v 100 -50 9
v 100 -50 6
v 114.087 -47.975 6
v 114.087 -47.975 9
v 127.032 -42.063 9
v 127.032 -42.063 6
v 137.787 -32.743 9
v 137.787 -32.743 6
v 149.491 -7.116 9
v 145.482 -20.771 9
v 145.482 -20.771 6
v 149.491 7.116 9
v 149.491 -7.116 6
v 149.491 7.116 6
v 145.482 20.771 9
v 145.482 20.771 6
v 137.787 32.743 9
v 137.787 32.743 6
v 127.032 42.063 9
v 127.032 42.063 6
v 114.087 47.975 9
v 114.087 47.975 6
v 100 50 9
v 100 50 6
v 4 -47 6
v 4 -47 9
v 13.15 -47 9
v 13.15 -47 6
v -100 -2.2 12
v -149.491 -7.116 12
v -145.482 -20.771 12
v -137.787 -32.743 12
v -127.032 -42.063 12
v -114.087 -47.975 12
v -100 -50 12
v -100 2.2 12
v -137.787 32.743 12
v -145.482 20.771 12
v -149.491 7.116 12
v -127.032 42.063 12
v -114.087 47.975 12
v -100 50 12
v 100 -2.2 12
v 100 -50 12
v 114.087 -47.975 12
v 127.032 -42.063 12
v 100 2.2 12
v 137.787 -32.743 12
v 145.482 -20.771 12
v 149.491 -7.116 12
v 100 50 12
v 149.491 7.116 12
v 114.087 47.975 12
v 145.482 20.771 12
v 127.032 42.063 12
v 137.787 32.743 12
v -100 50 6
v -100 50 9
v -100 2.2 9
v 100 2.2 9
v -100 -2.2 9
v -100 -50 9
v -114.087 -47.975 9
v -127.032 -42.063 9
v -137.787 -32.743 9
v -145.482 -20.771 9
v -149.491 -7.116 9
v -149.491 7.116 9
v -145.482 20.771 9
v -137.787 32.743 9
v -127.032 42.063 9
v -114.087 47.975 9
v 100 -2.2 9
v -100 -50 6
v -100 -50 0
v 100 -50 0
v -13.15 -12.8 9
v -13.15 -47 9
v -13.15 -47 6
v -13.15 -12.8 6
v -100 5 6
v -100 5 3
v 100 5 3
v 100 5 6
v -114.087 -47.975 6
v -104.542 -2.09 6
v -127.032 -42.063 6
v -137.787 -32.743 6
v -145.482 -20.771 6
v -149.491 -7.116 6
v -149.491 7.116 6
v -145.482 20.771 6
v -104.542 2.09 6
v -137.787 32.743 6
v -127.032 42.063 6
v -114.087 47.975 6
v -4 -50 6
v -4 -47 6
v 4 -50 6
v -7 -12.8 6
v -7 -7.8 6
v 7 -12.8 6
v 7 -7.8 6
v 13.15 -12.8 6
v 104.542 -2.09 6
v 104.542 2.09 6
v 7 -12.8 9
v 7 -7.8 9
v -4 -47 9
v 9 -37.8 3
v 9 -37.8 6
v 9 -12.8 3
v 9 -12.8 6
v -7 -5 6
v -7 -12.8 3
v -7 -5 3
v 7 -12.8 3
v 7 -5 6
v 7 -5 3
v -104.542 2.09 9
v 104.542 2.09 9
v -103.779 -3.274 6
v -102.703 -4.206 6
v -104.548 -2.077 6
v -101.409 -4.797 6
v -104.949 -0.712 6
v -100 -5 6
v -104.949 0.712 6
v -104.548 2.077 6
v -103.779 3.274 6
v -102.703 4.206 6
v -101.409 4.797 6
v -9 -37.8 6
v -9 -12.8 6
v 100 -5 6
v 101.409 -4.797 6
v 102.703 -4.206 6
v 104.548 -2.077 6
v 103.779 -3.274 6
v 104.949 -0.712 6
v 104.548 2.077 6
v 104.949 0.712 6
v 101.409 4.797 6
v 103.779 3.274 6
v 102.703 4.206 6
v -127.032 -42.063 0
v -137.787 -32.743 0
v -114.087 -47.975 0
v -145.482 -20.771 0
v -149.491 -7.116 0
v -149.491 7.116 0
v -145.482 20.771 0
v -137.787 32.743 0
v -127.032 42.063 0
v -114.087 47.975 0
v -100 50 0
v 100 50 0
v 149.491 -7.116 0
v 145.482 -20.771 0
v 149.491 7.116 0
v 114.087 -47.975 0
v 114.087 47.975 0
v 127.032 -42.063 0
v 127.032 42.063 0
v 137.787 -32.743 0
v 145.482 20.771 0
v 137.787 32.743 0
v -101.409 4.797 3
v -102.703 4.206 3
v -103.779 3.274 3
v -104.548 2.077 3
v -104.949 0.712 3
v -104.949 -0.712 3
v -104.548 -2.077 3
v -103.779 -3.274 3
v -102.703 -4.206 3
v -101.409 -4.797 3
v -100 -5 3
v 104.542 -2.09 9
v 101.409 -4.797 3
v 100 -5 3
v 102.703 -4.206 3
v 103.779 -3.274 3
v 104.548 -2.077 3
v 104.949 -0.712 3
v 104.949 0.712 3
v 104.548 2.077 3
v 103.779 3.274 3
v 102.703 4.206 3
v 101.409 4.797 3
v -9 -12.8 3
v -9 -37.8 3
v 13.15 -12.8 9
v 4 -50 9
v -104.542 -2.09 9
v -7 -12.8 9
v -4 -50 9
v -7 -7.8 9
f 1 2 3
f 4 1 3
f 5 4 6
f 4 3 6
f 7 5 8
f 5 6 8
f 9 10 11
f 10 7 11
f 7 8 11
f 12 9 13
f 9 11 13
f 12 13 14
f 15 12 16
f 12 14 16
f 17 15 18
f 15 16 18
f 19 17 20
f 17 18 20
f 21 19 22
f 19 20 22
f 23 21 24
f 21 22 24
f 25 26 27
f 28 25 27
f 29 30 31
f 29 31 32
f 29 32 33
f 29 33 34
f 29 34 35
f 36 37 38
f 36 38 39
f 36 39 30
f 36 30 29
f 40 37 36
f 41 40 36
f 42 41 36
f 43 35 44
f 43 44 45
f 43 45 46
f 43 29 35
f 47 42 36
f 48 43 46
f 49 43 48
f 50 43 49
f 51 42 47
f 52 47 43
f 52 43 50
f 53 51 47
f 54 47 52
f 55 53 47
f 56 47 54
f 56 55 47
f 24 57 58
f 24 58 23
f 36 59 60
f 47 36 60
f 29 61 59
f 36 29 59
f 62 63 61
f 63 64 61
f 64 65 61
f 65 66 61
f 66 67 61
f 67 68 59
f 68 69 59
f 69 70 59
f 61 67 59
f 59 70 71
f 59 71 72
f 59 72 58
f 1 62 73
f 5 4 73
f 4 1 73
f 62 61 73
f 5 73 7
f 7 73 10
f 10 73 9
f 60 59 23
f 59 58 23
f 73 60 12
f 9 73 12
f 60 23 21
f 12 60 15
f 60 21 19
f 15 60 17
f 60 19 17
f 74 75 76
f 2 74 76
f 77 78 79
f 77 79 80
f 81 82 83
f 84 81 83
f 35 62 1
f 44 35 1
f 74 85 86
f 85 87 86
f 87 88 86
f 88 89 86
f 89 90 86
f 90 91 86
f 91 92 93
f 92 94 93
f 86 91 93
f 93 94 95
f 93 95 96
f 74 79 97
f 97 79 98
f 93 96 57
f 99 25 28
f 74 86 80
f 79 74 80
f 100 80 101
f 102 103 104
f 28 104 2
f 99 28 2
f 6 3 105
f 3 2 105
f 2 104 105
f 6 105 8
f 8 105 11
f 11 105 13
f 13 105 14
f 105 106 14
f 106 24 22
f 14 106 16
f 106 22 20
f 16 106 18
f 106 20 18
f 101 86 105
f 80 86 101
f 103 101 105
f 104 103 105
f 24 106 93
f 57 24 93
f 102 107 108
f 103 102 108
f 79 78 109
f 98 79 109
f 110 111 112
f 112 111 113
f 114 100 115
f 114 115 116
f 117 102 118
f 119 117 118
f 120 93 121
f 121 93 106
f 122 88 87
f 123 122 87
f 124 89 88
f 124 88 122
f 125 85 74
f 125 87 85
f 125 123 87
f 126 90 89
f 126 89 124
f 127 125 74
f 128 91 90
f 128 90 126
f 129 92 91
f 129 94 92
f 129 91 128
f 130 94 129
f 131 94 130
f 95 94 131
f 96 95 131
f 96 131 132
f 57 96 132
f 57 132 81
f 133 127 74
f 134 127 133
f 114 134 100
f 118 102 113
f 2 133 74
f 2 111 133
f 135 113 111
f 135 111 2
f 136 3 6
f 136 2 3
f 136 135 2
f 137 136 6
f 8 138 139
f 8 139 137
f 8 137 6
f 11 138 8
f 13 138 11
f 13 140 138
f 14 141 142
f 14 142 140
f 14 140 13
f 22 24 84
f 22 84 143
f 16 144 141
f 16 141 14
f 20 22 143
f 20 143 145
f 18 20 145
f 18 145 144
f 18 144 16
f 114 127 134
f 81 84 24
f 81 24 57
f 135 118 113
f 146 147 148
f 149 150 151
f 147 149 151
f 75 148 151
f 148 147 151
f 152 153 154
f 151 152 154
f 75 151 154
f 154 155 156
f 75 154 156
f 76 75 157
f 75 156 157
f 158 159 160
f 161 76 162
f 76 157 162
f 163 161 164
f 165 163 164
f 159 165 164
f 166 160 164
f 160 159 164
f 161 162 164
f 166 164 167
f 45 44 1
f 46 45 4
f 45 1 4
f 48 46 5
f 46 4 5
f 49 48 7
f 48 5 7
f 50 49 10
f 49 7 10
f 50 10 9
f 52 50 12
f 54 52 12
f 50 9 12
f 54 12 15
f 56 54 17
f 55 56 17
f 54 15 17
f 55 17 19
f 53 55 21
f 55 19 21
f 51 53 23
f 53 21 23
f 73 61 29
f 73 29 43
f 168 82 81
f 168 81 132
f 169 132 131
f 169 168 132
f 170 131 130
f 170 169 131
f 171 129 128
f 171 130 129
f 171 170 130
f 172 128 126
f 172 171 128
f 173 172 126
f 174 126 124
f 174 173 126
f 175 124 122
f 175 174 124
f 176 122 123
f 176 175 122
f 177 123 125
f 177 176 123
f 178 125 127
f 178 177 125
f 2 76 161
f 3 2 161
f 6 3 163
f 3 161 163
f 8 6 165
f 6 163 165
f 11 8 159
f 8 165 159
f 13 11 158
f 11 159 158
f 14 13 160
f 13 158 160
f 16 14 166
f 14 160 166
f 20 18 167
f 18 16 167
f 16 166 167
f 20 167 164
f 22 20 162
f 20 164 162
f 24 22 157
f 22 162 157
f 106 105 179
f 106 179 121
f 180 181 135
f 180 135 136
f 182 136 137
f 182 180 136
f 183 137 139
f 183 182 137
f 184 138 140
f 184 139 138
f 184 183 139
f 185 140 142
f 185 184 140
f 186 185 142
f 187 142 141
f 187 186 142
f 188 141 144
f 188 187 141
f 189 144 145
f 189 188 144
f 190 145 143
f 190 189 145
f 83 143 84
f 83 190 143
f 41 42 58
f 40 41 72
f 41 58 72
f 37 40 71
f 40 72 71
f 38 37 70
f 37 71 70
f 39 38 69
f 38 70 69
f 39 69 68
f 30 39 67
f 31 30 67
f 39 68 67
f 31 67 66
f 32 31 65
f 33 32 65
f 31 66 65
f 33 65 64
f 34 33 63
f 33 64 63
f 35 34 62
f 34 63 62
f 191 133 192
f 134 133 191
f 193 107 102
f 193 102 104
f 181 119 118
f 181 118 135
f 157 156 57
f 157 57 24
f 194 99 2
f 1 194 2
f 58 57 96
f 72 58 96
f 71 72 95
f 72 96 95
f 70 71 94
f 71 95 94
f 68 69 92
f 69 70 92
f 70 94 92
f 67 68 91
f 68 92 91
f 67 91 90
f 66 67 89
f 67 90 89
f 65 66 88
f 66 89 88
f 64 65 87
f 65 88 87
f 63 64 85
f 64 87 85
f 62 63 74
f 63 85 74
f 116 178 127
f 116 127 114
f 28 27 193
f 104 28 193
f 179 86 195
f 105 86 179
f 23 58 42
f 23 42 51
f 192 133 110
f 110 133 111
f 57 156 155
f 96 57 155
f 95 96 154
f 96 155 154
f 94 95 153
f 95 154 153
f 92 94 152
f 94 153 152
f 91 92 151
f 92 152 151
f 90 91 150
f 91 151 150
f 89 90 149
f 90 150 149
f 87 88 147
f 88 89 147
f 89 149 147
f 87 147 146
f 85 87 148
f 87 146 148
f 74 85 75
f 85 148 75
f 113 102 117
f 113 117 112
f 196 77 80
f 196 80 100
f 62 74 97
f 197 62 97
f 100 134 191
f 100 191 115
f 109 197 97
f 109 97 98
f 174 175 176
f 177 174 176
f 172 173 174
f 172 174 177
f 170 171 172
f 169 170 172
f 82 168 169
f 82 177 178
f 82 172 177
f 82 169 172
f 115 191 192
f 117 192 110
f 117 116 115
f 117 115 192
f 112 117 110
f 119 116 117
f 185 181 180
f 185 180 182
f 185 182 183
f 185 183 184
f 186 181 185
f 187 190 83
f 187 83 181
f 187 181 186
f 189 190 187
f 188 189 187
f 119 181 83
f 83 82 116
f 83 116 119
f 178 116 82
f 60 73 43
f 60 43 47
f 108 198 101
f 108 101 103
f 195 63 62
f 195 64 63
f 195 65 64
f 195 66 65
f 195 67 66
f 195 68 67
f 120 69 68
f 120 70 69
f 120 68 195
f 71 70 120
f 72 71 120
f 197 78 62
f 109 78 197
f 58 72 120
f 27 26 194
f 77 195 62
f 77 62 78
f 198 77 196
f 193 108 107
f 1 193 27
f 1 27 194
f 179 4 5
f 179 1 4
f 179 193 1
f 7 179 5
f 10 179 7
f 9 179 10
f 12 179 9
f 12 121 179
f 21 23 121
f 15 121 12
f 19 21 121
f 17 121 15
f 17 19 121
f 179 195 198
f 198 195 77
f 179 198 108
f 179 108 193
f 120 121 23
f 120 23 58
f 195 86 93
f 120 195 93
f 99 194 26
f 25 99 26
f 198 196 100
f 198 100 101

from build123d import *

# Parameters (mm, degrees)
BOX_BOTTOM_HALF_0_W     = 301.98633
BOX_BOTTOM_HALF_0_H     = 102
BOX_BOTTOM_HALF_0_DEPTH = 7
PAD_DEPTH               = 3
PAD001_DEPTH            = 3
SKETCH002_W             = 209.08447
SKETCH002_H             = 4.18
PAD002_DEPTH            = 3
SKETCH003_W             = 26.3
SKETCH003_H             = 34.2
POCKET_DEPTH            = 3
SKETCH004_W             = 18
SKETCH004_H             = 25
POCKET001_DEPTH         = 3
SKETCH005_W             = 14
SKETCH005_H             = 5
POCKET002_DEPTH         = 6
SKETCH006_W             = 14
SKETCH006_H             = 3
POCKET003_DEPTH         = 3
SKETCH007_W             = 8
SKETCH007_H             = 3
POCKET004_DEPTH         = 3
SKETCH008_W             = 200
SKETCH008_H             = 4.4
PAD003_DEPTH            = 3
BOX_BOTTOM_HALF_1_W     = 301.98633
BOX_BOTTOM_HALF_1_H     = 102
BOX_BOTTOM_HALF_1_DEPTH = 4


with BuildPart() as box_bottom_half_0_body:
    # box_bottom_half_0 → box_bottom_half_0 (new body)
    with BuildSketch(Plane(origin=(-150.993165, -51, -1), x_dir=(1, 0, 0), z_dir=(0, 0, 1))):
        with Locations((150.993165, 51)):
            Rectangle(BOX_BOTTOM_HALF_0_W, BOX_BOTTOM_HALF_0_H)
    extrude(amount=BOX_BOTTOM_HALF_0_DEPTH)


with BuildPart() as body:
    # Sketch → Pad (new body)
    with BuildSketch(Plane.XY):
        with BuildLine():
            ThreePointArc((-100, 50), (-150, 0), (-100, -50))
            Line((-100, -50), (100, -50))
            ThreePointArc((100, -50), (150, 0), (100, 50))
            Line((-100, 50), (100, 50))
        make_face()
    extrude(amount=PAD_DEPTH)

    # Sketch001 (on Face6 of Pad) → Pad001 (join)
    with BuildSketch(Plane.XY.offset(3)):
        with BuildLine():
            ThreePointArc((-100, 50), (-150, 0), (-100, -50))
            Line((-100, -50), (100, -50))
            ThreePointArc((100, -50), (150, 0), (100, 50))
            Line((-100, 50), (100, 50))
        make_face()
        with BuildLine():
            ThreePointArc((-100, 5), (-105, 0), (-100, -5))
            Line((-100, -5), (100, -5))
            ThreePointArc((100, -5), (105, 0), (100, 5))
            Line((-100, 5), (100, 5))
        make_face(mode=Mode.SUBTRACT)
    extrude(amount=PAD001_DEPTH)

    # Sketch002 (on Face9 of Pad001) → Pad002 (join)
    with BuildSketch(Plane.XY.offset(6)):
        with BuildLine():
            ThreePointArc((-100, 50), (-150, 0), (-100, -50))
            Line((-100, -50), (100, -50))
            ThreePointArc((100, -50), (150, 0), (100, 50))
            Line((-100, 50), (100, 50))
        make_face()
        Rectangle(SKETCH002_W, SKETCH002_H, mode=Mode.SUBTRACT)
    extrude(amount=PAD002_DEPTH)

    # Sketch003 (on Face13 of Pad002) → Pocket (cut)
    with BuildSketch(Plane.XY.offset(9)):
        with Locations((0, -29.9)):
            Rectangle(SKETCH003_W, SKETCH003_H)
    extrude(amount=-POCKET_DEPTH, mode=Mode.SUBTRACT)

    # Sketch004 (on Face27 of Pocket) → Pocket001 (cut)
    with BuildSketch(Plane.XY.offset(6)):
        with Locations((0, -25.3)):
            Rectangle(SKETCH004_W, SKETCH004_H)
    extrude(amount=-POCKET001_DEPTH, mode=Mode.SUBTRACT)

    # Sketch005 (on Face13 of Pocket001) → Pocket002 (cut)
    with BuildSketch(Plane.XY.offset(9)):
        with Locations((0, -10.3)):
            Rectangle(SKETCH005_W, SKETCH005_H)
    extrude(amount=-POCKET002_DEPTH, mode=Mode.SUBTRACT)

    # Sketch006 (on Face23 of Pocket002) → Pocket003 (cut)
    with BuildSketch(Plane.XZ.offset(7.8)):
        with Locations((0, 4.5)):
            Rectangle(SKETCH006_W, SKETCH006_H)
    extrude(amount=-POCKET003_DEPTH, mode=Mode.SUBTRACT)

    # Sketch007 (on Face13 of Pocket003) → Pocket004 (cut)
    with BuildSketch(Plane.XY.offset(9)):
        with Locations((0, -48.5)):
            Rectangle(SKETCH007_W, SKETCH007_H)
    extrude(amount=-POCKET004_DEPTH, mode=Mode.SUBTRACT)

    # Sketch008 (on Face15 of Pocket004) → Pad003 (join)
    with BuildSketch(Plane.XY.offset(9)):
        with BuildLine():
            ThreePointArc((-100, 50), (-150, 0), (-100, -50))
            Line((-100, -50), (100, -50))
            ThreePointArc((100, -50), (150, 0), (100, 50))
            Line((-100, 50), (100, 50))
        make_face()
        Rectangle(SKETCH008_W, SKETCH008_H, mode=Mode.SUBTRACT)
    extrude(amount=PAD003_DEPTH)


with BuildPart() as bottom_half_0_body:
    # bottom_half_0 base: copy of Body
    add(body.part)

    # bottom_half_0: intersect box_bottom_half_0 body
    add(box_bottom_half_0_body.part, mode=Mode.INTERSECT)


with BuildPart() as box_bottom_half_1_body:
    # box_bottom_half_1 → box_bottom_half_1 (new body)
    with BuildSketch(Plane(origin=(-150.993165, -51, 5), x_dir=(1, 0, 0), z_dir=(0, 0, 1))):
        with Locations((150.993165, 51)):
            Rectangle(BOX_BOTTOM_HALF_1_W, BOX_BOTTOM_HALF_1_H)
    extrude(amount=BOX_BOTTOM_HALF_1_DEPTH)


with BuildPart() as top_half_0_body:
    # top_half_0 base: copy of Body
    add(body.part)

    # top_half_0: cut box_bottom_half_0 body
    add(box_bottom_half_0_body.part, mode=Mode.SUBTRACT)


with BuildPart() as bottom_half_1_body:
    # bottom_half_1 base: copy of top_half_0 body
    add(top_half_0_body.part)

    # bottom_half_1: intersect box_bottom_half_1 body
    add(box_bottom_half_1_body.part, mode=Mode.INTERSECT)


with BuildPart() as top_half_1_body:
    # top_half_1 base: copy of top_half_0 body
    add(top_half_0_body.part)

    # top_half_1: cut box_bottom_half_1 body
    add(box_bottom_half_1_body.part, mode=Mode.SUBTRACT)


solid = Compound([bottom_half_0_body.part, bottom_half_1_body.part, top_half_1_body.part])
